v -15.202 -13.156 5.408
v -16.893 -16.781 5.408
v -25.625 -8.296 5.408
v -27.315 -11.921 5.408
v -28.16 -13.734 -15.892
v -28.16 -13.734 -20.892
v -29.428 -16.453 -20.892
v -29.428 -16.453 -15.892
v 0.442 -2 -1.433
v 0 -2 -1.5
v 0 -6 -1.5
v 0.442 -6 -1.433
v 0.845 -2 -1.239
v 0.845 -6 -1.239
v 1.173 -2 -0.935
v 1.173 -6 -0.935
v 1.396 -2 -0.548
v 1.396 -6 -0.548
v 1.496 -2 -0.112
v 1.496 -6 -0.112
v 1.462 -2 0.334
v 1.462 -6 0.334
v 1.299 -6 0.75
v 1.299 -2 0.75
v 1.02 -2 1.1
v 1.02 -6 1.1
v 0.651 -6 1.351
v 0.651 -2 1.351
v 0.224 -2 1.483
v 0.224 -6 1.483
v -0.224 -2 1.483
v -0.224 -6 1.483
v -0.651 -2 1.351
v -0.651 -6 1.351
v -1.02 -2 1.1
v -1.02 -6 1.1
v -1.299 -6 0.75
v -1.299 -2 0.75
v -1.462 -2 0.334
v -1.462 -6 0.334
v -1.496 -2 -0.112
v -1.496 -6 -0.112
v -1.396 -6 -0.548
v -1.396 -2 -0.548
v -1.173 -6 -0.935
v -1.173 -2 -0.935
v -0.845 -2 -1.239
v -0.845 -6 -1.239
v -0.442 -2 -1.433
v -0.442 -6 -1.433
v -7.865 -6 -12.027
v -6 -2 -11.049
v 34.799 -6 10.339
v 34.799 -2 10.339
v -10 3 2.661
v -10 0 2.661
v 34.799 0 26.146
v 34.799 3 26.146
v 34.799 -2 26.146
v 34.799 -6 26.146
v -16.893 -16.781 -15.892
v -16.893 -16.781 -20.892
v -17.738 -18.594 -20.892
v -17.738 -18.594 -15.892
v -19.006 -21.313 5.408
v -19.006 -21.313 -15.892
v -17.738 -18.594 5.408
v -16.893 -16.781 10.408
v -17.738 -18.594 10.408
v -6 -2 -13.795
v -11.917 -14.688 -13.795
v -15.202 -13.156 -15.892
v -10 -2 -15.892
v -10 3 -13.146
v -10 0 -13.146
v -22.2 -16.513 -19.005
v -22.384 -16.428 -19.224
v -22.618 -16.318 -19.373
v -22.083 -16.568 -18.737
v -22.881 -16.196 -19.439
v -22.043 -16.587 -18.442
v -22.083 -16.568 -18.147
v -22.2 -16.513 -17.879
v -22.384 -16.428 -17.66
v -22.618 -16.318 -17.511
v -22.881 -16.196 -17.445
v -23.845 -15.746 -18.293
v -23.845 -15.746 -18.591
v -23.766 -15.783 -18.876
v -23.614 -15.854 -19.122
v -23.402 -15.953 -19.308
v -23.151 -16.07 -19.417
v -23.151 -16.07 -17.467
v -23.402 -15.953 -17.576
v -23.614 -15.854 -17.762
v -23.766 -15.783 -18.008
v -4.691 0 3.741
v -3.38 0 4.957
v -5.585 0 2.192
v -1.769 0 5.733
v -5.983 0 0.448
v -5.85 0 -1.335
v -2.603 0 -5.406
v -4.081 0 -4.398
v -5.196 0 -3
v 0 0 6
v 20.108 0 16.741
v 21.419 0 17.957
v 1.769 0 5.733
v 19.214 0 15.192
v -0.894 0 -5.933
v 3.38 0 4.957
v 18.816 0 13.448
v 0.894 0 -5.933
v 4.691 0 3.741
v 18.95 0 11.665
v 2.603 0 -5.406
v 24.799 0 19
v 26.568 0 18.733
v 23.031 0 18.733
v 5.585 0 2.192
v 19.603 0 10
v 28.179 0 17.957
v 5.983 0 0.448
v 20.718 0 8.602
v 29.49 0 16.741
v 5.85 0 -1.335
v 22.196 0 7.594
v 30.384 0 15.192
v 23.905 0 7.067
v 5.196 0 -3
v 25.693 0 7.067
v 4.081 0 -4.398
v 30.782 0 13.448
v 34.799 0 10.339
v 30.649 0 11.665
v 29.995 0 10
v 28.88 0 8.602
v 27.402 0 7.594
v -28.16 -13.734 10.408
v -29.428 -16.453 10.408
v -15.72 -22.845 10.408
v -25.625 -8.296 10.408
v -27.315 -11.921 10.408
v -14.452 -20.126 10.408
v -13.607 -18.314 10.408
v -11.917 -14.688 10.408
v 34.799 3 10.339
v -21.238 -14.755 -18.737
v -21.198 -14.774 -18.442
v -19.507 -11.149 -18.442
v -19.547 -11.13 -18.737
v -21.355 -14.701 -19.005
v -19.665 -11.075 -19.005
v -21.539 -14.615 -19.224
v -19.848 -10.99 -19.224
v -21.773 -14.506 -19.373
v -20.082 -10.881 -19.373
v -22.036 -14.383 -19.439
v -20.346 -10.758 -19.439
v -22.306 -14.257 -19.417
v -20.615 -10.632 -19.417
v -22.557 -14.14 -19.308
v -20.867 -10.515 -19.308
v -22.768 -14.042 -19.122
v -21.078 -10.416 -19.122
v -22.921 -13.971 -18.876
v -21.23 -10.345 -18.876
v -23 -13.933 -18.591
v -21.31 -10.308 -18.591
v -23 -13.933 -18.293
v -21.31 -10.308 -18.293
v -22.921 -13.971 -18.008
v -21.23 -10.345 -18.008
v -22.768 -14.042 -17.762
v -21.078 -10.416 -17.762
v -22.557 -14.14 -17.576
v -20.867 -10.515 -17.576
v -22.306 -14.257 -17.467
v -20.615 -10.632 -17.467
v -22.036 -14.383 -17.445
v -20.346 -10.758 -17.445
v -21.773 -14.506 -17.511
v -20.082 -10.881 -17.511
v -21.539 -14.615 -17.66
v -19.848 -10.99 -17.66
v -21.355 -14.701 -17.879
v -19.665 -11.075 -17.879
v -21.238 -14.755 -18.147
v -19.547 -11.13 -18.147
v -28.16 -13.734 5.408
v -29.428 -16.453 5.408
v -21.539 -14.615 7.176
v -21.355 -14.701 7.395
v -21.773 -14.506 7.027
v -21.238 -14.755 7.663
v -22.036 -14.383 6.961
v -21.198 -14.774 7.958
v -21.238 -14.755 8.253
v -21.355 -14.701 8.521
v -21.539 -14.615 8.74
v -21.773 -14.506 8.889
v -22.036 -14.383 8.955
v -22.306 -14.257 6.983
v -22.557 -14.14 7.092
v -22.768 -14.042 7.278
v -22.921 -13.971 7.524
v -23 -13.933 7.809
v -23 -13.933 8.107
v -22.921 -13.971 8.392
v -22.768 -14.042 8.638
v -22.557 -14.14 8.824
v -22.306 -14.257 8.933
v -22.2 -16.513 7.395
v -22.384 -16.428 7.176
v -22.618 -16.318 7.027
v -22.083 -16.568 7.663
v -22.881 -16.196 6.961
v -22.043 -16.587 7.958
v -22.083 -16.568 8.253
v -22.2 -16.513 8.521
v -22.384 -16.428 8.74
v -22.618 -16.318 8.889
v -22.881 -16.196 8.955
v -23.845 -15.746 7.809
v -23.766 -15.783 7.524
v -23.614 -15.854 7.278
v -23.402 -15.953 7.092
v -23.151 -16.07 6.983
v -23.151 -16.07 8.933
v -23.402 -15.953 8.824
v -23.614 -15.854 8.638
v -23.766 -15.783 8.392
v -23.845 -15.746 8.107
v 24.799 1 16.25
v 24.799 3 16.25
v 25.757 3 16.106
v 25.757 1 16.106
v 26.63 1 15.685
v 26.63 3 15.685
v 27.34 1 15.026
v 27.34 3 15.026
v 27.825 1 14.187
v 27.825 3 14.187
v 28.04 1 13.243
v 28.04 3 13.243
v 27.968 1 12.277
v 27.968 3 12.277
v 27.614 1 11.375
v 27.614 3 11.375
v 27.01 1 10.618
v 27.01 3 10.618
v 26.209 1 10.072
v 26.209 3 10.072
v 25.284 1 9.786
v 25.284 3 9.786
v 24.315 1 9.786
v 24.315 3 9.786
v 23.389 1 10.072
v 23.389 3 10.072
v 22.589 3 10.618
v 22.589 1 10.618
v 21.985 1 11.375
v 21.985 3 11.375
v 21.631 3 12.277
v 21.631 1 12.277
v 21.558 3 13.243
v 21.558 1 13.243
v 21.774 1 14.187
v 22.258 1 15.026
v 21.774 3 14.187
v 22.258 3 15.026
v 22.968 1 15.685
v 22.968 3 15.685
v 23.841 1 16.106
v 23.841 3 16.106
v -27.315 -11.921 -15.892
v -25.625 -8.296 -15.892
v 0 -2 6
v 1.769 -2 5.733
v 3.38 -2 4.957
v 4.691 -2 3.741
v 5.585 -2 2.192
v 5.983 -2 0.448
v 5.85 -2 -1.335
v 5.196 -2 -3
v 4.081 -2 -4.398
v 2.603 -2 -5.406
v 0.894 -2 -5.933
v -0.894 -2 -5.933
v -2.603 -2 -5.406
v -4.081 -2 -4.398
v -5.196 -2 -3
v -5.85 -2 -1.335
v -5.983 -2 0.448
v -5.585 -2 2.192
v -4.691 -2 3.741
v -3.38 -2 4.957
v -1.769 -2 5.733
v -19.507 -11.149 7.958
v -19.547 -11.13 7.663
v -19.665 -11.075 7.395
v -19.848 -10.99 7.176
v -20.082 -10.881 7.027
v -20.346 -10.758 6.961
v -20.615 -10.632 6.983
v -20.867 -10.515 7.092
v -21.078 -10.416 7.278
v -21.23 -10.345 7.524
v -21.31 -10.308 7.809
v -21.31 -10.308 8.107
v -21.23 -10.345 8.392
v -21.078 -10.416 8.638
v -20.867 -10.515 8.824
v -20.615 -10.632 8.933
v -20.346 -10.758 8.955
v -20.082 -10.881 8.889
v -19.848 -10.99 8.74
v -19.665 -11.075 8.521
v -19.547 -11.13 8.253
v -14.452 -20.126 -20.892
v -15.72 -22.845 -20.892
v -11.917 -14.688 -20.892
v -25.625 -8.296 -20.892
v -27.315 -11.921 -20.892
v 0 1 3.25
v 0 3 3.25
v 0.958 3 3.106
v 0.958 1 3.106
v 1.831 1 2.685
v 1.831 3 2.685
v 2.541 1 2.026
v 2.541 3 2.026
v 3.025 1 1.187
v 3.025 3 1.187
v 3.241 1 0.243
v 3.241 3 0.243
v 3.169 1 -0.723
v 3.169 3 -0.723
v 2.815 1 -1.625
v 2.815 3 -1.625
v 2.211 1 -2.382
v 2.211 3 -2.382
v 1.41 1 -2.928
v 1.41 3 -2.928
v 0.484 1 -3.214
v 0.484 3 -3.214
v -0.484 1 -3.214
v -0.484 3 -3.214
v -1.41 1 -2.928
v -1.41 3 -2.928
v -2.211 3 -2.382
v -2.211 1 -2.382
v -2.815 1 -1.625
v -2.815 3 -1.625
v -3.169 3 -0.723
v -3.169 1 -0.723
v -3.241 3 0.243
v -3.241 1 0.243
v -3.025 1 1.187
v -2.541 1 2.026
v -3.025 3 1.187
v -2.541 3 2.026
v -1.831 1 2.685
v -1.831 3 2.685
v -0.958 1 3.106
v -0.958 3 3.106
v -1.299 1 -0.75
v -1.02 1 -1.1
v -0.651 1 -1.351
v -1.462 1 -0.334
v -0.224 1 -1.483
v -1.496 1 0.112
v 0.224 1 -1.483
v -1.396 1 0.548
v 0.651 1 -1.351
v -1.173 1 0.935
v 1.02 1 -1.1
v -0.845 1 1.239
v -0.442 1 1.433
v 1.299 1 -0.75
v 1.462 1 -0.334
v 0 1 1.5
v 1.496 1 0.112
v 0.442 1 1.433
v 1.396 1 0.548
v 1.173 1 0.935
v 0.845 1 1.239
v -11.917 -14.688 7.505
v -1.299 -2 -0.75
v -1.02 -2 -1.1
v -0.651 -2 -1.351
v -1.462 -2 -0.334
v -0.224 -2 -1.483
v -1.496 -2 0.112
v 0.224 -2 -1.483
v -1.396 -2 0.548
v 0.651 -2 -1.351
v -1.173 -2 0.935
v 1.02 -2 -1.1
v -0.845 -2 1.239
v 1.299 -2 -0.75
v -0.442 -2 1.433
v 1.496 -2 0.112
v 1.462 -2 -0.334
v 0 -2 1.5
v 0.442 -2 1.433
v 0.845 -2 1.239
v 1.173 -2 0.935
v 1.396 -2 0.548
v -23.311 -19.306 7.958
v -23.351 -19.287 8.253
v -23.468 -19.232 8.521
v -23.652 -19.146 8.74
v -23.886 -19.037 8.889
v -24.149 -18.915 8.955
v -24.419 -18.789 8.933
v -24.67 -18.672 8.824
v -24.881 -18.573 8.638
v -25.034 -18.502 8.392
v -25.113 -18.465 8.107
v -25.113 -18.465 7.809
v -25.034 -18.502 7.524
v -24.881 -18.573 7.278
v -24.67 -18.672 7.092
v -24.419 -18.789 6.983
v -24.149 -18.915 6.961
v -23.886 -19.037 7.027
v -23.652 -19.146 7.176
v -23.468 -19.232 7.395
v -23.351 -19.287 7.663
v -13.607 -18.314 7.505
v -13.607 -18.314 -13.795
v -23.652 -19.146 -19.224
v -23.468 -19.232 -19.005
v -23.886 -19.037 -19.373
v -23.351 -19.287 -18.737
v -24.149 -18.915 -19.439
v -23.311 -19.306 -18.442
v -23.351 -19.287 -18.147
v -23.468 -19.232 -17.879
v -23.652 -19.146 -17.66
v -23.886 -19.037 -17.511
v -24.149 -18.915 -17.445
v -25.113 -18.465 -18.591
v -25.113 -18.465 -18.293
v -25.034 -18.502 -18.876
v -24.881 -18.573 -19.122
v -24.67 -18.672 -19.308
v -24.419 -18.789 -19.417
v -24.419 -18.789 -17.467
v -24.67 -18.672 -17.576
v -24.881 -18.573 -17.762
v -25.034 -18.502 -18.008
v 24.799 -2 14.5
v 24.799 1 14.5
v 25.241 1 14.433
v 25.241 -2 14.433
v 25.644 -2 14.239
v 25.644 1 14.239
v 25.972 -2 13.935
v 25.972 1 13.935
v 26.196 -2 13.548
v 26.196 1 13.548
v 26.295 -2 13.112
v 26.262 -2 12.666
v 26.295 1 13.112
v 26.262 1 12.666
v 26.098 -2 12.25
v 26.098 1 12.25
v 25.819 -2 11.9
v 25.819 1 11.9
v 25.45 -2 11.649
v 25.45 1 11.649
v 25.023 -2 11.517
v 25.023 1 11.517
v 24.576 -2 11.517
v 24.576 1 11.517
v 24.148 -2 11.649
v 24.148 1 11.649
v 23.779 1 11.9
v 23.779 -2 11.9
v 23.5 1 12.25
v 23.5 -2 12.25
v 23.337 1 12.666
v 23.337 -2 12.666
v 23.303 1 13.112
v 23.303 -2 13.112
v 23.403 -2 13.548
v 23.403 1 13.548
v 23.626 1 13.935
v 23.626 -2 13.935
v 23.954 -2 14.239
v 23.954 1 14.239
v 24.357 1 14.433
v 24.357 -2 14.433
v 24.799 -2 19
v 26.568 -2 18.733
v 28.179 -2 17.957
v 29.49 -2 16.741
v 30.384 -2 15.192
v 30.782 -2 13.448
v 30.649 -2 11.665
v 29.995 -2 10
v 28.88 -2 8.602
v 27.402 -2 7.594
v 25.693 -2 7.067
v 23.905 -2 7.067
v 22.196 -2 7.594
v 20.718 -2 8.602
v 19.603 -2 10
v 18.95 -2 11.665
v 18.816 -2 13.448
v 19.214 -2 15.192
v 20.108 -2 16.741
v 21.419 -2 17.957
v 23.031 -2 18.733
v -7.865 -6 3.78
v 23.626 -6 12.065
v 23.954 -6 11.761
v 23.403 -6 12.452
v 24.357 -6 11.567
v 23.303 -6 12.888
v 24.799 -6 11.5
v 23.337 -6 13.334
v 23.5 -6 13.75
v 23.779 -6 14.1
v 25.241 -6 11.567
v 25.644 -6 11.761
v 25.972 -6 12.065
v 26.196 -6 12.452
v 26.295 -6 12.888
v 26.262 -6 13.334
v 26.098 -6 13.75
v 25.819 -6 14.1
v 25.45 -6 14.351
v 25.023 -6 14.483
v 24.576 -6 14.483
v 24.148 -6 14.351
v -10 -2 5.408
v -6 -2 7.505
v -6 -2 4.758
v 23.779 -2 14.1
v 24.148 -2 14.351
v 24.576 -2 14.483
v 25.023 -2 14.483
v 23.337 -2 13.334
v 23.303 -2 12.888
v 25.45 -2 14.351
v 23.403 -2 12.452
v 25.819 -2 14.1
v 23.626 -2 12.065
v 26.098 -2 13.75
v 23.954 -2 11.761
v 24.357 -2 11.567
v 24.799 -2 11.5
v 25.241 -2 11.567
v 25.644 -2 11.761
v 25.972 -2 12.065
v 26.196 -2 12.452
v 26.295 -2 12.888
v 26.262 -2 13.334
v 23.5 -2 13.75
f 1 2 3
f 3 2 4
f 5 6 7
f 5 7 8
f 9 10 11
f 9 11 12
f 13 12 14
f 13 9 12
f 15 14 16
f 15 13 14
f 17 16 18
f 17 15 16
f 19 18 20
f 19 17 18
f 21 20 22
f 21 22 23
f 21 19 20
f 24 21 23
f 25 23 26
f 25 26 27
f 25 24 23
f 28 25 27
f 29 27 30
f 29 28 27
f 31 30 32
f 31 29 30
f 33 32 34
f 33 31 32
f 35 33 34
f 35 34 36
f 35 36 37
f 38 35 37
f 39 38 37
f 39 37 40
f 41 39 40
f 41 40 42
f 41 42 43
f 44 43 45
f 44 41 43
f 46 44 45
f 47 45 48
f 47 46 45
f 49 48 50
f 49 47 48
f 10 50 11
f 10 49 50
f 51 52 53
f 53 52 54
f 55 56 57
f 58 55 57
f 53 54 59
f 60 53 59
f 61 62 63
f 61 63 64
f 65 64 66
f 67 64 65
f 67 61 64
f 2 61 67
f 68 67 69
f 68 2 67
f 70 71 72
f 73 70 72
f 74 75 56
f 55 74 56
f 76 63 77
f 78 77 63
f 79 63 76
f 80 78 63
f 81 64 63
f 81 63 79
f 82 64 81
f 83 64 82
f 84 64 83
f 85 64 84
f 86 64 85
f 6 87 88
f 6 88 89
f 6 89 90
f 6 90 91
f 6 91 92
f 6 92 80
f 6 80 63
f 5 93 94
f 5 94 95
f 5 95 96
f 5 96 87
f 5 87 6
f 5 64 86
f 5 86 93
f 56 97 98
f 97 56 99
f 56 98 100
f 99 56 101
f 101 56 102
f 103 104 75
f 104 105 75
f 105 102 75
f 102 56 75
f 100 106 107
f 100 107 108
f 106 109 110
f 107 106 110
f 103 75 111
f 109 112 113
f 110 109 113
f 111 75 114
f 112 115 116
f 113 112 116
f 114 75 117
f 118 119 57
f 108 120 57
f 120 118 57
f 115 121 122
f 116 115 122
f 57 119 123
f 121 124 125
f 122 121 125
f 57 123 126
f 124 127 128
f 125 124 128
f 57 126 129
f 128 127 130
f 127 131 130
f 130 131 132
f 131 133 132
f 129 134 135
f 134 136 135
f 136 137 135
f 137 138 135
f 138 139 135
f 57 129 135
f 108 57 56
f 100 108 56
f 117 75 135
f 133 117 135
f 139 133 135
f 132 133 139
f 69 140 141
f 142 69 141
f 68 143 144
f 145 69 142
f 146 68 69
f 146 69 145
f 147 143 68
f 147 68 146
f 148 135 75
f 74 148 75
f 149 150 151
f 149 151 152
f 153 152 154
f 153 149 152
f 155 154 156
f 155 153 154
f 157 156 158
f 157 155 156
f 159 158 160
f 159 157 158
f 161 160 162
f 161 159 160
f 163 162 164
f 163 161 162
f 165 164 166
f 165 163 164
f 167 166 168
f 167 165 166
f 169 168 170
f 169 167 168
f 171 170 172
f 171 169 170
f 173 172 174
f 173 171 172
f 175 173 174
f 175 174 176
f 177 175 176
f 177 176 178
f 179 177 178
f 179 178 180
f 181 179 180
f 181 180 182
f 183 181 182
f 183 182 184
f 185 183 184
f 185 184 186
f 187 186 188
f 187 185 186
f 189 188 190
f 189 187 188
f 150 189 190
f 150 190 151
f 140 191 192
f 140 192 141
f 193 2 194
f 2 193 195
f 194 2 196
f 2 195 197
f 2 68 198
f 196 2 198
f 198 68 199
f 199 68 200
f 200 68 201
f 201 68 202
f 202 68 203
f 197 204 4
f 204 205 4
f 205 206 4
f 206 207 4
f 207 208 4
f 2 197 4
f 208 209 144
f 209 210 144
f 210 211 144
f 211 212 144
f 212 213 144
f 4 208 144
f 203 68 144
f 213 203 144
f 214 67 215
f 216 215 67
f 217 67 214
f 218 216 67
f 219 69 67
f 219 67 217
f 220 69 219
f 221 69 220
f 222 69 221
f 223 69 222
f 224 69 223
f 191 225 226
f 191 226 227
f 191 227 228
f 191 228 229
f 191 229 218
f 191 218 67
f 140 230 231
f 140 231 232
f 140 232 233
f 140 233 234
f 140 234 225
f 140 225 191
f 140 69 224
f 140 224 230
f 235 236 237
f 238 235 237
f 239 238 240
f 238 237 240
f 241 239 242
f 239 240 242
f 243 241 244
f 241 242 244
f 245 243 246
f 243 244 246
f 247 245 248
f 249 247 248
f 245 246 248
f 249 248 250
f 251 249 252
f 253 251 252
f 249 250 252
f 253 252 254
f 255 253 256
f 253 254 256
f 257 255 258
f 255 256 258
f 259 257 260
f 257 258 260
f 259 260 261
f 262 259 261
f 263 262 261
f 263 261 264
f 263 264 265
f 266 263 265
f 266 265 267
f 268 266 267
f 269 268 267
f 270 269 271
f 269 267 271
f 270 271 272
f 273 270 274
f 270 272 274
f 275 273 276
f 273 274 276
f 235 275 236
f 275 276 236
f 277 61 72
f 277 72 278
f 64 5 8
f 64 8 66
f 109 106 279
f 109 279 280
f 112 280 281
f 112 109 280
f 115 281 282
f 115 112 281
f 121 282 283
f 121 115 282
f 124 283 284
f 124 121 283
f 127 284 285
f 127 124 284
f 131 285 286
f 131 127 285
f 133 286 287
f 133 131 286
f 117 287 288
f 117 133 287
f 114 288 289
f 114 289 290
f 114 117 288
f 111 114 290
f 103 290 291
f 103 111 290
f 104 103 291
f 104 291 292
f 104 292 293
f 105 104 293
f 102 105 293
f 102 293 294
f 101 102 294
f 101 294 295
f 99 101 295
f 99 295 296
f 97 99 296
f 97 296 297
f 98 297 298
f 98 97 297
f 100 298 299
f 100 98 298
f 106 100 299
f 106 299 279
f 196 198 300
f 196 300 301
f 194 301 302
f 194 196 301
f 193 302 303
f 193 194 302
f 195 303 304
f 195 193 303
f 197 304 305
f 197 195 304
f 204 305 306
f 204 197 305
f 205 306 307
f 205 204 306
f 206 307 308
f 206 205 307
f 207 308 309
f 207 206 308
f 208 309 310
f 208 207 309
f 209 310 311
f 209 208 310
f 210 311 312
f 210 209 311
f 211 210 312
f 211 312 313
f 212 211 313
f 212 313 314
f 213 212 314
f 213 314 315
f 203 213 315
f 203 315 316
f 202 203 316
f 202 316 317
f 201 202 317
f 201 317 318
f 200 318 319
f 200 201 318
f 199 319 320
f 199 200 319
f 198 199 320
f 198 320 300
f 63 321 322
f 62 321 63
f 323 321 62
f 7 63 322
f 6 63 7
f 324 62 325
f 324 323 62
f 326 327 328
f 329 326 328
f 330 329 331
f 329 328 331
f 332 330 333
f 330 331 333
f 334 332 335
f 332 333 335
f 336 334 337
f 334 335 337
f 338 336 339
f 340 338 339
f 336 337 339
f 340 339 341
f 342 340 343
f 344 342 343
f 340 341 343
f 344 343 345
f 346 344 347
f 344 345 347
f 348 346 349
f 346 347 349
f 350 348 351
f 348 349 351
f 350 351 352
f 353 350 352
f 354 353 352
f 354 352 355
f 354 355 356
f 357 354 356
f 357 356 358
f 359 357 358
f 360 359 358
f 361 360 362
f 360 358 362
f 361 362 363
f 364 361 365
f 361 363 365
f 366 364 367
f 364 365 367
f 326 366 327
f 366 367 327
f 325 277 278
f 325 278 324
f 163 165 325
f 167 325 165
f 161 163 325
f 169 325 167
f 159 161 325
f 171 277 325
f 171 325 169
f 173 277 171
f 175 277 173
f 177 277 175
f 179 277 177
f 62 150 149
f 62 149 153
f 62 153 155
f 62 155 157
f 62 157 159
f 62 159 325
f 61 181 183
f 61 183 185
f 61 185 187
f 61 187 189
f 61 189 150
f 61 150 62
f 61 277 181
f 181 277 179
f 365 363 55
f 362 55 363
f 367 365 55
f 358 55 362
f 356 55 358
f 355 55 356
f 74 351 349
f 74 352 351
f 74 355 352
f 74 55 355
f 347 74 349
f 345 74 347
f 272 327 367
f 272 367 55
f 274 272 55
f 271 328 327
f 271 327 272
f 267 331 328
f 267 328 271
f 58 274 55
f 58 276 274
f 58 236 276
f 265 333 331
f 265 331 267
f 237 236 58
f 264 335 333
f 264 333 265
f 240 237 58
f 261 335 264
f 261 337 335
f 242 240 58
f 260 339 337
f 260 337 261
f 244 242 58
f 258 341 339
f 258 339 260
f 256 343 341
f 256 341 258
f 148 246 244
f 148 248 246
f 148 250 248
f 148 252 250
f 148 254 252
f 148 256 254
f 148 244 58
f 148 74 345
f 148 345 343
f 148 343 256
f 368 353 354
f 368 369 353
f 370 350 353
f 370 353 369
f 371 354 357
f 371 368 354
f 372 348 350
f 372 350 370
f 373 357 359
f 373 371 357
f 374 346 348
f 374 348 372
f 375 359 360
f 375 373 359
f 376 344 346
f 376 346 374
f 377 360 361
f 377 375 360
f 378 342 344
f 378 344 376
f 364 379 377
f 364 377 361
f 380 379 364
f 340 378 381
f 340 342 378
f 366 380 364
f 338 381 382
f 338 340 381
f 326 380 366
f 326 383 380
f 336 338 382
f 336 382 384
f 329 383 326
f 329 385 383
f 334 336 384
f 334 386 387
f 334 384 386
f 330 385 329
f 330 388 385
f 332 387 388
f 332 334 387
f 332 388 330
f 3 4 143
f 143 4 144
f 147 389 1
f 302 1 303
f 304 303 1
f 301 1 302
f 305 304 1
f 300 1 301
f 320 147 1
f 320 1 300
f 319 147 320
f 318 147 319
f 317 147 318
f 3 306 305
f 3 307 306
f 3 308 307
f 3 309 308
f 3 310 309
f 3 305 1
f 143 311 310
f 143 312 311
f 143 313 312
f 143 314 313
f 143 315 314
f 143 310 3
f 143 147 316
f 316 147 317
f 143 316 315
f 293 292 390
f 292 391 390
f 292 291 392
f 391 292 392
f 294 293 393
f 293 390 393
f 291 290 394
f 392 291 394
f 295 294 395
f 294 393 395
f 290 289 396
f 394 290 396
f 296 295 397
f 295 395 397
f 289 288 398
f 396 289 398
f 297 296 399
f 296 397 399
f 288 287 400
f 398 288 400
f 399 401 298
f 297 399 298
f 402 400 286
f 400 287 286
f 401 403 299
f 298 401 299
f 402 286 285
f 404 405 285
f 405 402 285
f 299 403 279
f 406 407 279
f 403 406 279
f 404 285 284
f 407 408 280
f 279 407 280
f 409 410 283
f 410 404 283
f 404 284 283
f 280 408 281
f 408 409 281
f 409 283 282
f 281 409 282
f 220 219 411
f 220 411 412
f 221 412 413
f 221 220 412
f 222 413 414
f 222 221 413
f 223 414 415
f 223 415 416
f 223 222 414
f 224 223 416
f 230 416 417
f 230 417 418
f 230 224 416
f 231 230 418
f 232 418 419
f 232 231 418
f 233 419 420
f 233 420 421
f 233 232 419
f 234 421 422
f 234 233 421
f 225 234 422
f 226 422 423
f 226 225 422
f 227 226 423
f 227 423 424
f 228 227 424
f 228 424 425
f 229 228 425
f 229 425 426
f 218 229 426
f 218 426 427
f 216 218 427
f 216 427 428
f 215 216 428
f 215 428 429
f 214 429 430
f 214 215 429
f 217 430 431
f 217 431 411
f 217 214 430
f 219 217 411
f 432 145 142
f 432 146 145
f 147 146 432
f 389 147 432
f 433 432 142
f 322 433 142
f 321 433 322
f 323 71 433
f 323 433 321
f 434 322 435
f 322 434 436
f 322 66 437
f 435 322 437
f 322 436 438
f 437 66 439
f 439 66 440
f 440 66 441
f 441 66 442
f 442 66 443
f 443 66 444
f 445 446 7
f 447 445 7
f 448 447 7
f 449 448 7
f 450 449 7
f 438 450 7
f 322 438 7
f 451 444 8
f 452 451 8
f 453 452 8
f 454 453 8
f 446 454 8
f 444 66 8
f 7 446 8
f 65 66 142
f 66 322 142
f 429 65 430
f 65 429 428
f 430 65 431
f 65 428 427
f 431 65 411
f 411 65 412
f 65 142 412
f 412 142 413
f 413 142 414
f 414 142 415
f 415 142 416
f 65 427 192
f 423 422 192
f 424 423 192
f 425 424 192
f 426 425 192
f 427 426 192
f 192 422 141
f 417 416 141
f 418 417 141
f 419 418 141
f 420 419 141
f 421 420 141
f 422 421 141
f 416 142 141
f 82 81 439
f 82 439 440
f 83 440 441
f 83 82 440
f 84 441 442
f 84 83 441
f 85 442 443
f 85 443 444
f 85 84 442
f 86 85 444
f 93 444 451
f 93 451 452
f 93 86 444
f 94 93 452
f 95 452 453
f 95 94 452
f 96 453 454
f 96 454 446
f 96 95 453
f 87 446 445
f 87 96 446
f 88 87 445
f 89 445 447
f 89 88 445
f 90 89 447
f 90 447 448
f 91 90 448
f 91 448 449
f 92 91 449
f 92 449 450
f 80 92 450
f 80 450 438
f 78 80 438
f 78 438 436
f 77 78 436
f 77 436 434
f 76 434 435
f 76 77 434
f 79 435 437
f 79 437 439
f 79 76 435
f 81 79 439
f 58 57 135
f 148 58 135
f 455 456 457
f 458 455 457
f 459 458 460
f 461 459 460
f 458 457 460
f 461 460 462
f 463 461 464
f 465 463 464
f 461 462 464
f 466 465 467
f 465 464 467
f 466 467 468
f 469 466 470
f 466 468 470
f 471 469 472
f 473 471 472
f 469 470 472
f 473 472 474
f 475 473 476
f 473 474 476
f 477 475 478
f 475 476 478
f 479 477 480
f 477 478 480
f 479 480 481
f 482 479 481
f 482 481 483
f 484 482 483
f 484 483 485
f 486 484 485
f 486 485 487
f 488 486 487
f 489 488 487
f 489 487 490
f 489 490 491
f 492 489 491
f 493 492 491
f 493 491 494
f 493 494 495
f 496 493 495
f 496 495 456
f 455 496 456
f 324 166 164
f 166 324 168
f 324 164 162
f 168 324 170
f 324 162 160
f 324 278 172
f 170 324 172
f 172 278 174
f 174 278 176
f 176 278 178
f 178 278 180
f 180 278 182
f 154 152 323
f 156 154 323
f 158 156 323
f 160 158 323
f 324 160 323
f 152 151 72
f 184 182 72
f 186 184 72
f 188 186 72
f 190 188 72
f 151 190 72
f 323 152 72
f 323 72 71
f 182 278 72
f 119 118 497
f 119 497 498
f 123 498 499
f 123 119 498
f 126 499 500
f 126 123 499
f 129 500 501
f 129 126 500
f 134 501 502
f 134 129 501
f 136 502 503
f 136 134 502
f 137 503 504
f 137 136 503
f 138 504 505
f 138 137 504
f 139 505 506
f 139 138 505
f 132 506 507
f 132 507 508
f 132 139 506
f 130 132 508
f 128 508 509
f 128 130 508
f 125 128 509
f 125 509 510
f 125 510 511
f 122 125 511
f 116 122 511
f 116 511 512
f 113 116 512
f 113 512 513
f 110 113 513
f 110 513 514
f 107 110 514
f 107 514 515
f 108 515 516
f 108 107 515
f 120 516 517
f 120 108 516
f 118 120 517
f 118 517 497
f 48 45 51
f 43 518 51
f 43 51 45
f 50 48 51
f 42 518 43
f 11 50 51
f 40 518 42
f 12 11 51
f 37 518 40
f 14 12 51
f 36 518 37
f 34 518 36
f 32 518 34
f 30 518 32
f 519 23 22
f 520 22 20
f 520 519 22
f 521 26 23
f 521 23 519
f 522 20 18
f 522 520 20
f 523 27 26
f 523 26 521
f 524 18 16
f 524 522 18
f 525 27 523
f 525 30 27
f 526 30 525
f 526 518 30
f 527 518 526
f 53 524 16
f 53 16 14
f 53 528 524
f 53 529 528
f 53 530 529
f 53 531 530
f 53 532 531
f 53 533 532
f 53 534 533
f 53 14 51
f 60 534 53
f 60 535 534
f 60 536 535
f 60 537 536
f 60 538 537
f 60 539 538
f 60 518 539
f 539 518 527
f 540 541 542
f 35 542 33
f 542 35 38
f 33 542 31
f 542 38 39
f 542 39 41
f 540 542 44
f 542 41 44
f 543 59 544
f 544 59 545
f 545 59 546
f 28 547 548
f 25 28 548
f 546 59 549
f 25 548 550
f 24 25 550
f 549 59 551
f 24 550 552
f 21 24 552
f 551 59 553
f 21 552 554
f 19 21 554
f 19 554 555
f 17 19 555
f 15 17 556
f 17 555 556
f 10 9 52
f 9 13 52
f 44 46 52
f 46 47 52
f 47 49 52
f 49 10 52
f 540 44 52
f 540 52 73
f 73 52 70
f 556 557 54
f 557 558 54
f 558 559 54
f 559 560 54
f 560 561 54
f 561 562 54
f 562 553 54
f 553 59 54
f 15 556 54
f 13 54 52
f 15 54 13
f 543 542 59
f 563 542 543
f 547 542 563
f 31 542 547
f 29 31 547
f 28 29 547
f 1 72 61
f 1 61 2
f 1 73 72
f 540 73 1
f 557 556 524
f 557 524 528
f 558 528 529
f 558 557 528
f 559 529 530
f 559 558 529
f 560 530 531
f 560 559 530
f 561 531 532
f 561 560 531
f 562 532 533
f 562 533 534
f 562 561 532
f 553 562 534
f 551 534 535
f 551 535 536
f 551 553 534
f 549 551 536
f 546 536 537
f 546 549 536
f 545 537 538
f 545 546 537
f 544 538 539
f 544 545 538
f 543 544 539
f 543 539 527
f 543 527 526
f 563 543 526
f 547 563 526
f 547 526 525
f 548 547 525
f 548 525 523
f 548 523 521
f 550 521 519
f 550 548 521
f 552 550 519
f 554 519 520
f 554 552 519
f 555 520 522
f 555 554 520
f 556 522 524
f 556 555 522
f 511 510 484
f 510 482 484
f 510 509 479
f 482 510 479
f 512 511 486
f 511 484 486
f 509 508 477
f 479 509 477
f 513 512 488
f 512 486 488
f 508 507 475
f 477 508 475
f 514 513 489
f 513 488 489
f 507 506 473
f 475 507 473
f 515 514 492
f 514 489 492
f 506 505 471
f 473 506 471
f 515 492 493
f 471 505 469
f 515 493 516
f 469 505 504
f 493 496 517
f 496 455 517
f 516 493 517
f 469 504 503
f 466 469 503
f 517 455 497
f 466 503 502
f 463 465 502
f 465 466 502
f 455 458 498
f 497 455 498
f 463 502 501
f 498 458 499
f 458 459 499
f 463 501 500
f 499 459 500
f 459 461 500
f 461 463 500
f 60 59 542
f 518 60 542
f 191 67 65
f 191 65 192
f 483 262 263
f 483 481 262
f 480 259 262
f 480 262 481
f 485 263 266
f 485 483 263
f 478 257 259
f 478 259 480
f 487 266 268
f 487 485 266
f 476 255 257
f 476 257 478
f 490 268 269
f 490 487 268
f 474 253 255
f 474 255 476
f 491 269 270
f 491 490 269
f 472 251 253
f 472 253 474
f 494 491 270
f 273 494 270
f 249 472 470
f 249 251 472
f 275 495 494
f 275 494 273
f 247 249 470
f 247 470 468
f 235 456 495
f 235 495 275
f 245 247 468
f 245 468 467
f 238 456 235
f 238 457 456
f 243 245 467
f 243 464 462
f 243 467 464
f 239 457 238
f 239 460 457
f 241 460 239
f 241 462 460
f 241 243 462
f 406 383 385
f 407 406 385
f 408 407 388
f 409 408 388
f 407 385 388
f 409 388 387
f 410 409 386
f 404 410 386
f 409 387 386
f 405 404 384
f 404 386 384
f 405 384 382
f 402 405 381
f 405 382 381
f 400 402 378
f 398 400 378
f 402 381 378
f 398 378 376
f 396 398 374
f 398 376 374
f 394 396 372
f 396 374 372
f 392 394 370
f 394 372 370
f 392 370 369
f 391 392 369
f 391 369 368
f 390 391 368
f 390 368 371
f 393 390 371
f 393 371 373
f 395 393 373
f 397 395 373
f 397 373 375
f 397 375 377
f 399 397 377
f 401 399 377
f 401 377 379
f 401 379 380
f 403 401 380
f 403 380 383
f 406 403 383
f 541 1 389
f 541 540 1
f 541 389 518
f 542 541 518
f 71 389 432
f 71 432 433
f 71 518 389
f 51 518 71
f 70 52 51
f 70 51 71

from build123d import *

# Parameters (mm, degrees)
BOSS_EXTRUDE1_DEPTH     = 3
SKETCH1_R               = 6
BOSS_EXTRUDE3_DEPTH     = 2
SKETCH4_R               = 1.5
CUT_EXTRUDE1_DEPTH      = 44.812962497
SKETCH5_R               = 3.25
CUT_EXTRUDE2_DEPTH      = 2
SKETCH6_R               = 1.5
BOSS_EXTRUDE4_DEPTH     = 4
CUT_EXTRUDE3_DEPTH      = 48.222467532
CUT_EXTRUDE3_DEPTH_BACK = 48.222467532
SKETCH9_W               = 15.125231148
SKETCH9_H               = 5
SKETCH9_R               = 1
BOSS_EXTRUDE6_DEPTH     = 4
SKETCH10_W              = 3.625231148
SKETCH10_H              = 31.3
BOSS_EXTRUDE7_DEPTH     = 2
SKETCH11_R              = 1
BOSS_EXTRUDE8_DEPTH     = 3


with BuildPart() as part:
    # Sketch3 → Boss-Extrude1 (new body)
    with BuildSketch(Plane(origin=(0, 0, 0), x_dir=(1, 0, 0), z_dir=(0, 1, 0))):
        Polygon((-10, 13.145588768), (-10, -2.661376867), (34.799193535, -26.145588768), (34.799193535, -10.338623133), align=None)
    extrude(amount=BOSS_EXTRUDE1_DEPTH)

    # Sketch1 → Boss-Extrude3 (add)
    with BuildSketch(Plane(origin=(0, 0, 0), x_dir=(1, 0, 0), z_dir=(0, 1, 0))):
        with Locations(Location((0, 0, 0), (0, 0, 270))):
            Circle(SKETCH1_R)
        with Locations(Location((24.799193535, -13, 0), (0, 0, 270))):
            Circle(SKETCH1_R)
    extrude(amount=-BOSS_EXTRUDE3_DEPTH)

    # Sketch4 → Cut-Extrude1 (cut, through all)
    with BuildSketch(Plane(origin=(0, 3, 0), x_dir=(1, 0, 0), z_dir=(0, 1, 0))):
        with Locations(Location((0, 0, 0), (0, 0, 270))):
            Circle(SKETCH4_R)
        with Locations(Location((24.799193535, -13, 0), (0, 0, 270))):
            Circle(SKETCH4_R)
    extrude(amount=-CUT_EXTRUDE1_DEPTH, mode=Mode.SUBTRACT)

    # Sketch5 → Cut-Extrude2 (cut)
    with BuildSketch(Plane(origin=(0, 3, 0), x_dir=(1, 0, 0), z_dir=(0, 1, 0))):
        with Locations(Location((0, 0, 0), (0, 0, 270))):
            Circle(SKETCH5_R)
        with Locations(Location((24.799193535, -13, 0), (0, 0, 270))):
            Circle(SKETCH5_R)
    extrude(amount=-CUT_EXTRUDE2_DEPTH, mode=Mode.SUBTRACT)


with BuildPart() as body_2:
    # Sketch6 → Boss-Extrude4 (new body)
    with BuildSketch(Plane.XZ.offset(2)):
        Polygon((-10, 2.661376867), (-10, -13.145588768), (34.799193535, 10.338623133), (34.799193535, 26.145588768), align=None)
        with Locations(Location((0, 0, 0), (0, 0, 270))):
            Circle(SKETCH6_R, mode=Mode.SUBTRACT)
        with Locations(Location((24.799193535, 13, 0), (0, 0, 270))):
            Circle(SKETCH6_R, mode=Mode.SUBTRACT)
    extrude(amount=BOSS_EXTRUDE4_DEPTH)

    # Sketch16 → Loft1 section 0
    with BuildSketch(Plane(origin=(0, -18.313540167, 0), x_dir=(-1, 0, 0), z_dir=(0, -1, 0))):
        with BuildLine():
            Line((13.607128711, -7.50473643), (13.607128711, 13.79526357))
            Line((13.607128711, 13.79526357), (17.607128711, 15.892105951))
            Line((17.607128711, 15.892105951), (17.607128711, -5.407894049))
            Line((17.607128711, -5.407894049), (13.607128711, -7.50473643))
        make_face()
    # Sketch7 → Loft1 section 1
    with BuildSketch(Plane(origin=(0, -2, 0), x_dir=(1, 0, 0), z_dir=(0, 1, 0))):
        with BuildLine():
            Line((-10, 15.892105951), (-10, -5.407894049))
            Line((-10, -5.407894049), (-6, -7.50473643))
            Line((-6, -7.50473643), (-6, 13.79526357))
            Line((-6, 13.79526357), (-10, 15.892105951))
        make_face()
    loft()

    # Sketch17 → Cut-Extrude3 (cut, two sides: drawn at the far end of the back side and taken through both)
    with BuildSketch(Plane.XY.offset(-CUT_EXTRUDE3_DEPTH_BACK)):
        Polygon((-17.607128711, -18.313540167), (-13.607128711, -18.313540167), (-16.892703931, -16.78145128), align=None)
    extrude(amount=CUT_EXTRUDE3_DEPTH + CUT_EXTRUDE3_DEPTH_BACK, mode=Mode.SUBTRACT)

    # Sketch9 → Boss-Extrude6 (add)
    # profile 1 of 2: a face of its own
    with BuildSketch(Plane(origin=(-26.705419865, -12.205706693, 0), x_dir=(-0.9063077870366525, 0.42261826174069417, 0), z_dir=(0.4226182617406941, 0.9063077870366524, 0))):
        with Locations((-6.889749661, 7.907894049)):
            Rectangle(SKETCH9_W, SKETCH9_H)
        with Locations(Location((-5.077134087, 7.957894049, 0), (0, 0, 180))):
            Circle(SKETCH9_R, mode=Mode.SUBTRACT)
    # profile 2 of 2: a face of its own
    with BuildSketch(Plane(origin=(-26.705419865, -12.205706693, 0), x_dir=(-0.9063077870366525, 0.42261826174069417, 0), z_dir=(0.4226182617406941, 0.9063077870366524, 0))):
        Polygon((-10.827134087, -15.892105951), (0.672865913, -15.892105951), (0.672865913, -20.892105951), (-14.452365235, -20.892105951), (-14.452365235, -15.892105951), (-14.452365235, -13.79526357), align=None)
        with Locations(Location((-5.077134087, -18.442105951, 0), (0, 0, 180))):
            Circle(SKETCH9_R, mode=Mode.SUBTRACT)
    extrude(amount=BOSS_EXTRUDE6_DEPTH)

    # Sketch10 → Boss-Extrude7 (add)
    with BuildSketch(Plane(origin=(-50.114461272, -1.289891415, 0), x_dir=(-0.9063077870366525, 0.42261826174069417, 0), z_dir=(0.4226182617406941, 0.9063077870366524, 0))):
        with Locations((-38.468769054, -5.242105951)):
            Rectangle(SKETCH10_W, SKETCH10_H)
    extrude(amount=-BOSS_EXTRUDE7_DEPTH)

    # Sketch11 → Boss-Extrude8 (add)
    with BuildSketch(Plane(origin=(-10.290046849, -22.06707668, 0), x_dir=(0.9063077870366528, -0.4226182617406936, 0), z_dir=(-0.4226182617406936, -0.9063077870366528, 0))):
        Polygon((-19.717841347, 10.407894049), (-4.592610199, 10.407894049), (-4.592610199, -20.892105951), (-19.717841347, -20.892105951), (-19.717841347, -15.892105951), (-8.217841347, -15.892105951), (-8.217841347, 5.407894049), (-19.717841347, 5.407894049), align=None)
        with Locations((-13.967841347, -18.442105951)):
            Circle(SKETCH11_R, mode=Mode.SUBTRACT)
        with Locations((-13.967841347, 7.957894049)):
            Circle(SKETCH11_R, mode=Mode.SUBTRACT)
    extrude(amount=BOSS_EXTRUDE8_DEPTH)


solid = Compound([part.part, body_2.part])
